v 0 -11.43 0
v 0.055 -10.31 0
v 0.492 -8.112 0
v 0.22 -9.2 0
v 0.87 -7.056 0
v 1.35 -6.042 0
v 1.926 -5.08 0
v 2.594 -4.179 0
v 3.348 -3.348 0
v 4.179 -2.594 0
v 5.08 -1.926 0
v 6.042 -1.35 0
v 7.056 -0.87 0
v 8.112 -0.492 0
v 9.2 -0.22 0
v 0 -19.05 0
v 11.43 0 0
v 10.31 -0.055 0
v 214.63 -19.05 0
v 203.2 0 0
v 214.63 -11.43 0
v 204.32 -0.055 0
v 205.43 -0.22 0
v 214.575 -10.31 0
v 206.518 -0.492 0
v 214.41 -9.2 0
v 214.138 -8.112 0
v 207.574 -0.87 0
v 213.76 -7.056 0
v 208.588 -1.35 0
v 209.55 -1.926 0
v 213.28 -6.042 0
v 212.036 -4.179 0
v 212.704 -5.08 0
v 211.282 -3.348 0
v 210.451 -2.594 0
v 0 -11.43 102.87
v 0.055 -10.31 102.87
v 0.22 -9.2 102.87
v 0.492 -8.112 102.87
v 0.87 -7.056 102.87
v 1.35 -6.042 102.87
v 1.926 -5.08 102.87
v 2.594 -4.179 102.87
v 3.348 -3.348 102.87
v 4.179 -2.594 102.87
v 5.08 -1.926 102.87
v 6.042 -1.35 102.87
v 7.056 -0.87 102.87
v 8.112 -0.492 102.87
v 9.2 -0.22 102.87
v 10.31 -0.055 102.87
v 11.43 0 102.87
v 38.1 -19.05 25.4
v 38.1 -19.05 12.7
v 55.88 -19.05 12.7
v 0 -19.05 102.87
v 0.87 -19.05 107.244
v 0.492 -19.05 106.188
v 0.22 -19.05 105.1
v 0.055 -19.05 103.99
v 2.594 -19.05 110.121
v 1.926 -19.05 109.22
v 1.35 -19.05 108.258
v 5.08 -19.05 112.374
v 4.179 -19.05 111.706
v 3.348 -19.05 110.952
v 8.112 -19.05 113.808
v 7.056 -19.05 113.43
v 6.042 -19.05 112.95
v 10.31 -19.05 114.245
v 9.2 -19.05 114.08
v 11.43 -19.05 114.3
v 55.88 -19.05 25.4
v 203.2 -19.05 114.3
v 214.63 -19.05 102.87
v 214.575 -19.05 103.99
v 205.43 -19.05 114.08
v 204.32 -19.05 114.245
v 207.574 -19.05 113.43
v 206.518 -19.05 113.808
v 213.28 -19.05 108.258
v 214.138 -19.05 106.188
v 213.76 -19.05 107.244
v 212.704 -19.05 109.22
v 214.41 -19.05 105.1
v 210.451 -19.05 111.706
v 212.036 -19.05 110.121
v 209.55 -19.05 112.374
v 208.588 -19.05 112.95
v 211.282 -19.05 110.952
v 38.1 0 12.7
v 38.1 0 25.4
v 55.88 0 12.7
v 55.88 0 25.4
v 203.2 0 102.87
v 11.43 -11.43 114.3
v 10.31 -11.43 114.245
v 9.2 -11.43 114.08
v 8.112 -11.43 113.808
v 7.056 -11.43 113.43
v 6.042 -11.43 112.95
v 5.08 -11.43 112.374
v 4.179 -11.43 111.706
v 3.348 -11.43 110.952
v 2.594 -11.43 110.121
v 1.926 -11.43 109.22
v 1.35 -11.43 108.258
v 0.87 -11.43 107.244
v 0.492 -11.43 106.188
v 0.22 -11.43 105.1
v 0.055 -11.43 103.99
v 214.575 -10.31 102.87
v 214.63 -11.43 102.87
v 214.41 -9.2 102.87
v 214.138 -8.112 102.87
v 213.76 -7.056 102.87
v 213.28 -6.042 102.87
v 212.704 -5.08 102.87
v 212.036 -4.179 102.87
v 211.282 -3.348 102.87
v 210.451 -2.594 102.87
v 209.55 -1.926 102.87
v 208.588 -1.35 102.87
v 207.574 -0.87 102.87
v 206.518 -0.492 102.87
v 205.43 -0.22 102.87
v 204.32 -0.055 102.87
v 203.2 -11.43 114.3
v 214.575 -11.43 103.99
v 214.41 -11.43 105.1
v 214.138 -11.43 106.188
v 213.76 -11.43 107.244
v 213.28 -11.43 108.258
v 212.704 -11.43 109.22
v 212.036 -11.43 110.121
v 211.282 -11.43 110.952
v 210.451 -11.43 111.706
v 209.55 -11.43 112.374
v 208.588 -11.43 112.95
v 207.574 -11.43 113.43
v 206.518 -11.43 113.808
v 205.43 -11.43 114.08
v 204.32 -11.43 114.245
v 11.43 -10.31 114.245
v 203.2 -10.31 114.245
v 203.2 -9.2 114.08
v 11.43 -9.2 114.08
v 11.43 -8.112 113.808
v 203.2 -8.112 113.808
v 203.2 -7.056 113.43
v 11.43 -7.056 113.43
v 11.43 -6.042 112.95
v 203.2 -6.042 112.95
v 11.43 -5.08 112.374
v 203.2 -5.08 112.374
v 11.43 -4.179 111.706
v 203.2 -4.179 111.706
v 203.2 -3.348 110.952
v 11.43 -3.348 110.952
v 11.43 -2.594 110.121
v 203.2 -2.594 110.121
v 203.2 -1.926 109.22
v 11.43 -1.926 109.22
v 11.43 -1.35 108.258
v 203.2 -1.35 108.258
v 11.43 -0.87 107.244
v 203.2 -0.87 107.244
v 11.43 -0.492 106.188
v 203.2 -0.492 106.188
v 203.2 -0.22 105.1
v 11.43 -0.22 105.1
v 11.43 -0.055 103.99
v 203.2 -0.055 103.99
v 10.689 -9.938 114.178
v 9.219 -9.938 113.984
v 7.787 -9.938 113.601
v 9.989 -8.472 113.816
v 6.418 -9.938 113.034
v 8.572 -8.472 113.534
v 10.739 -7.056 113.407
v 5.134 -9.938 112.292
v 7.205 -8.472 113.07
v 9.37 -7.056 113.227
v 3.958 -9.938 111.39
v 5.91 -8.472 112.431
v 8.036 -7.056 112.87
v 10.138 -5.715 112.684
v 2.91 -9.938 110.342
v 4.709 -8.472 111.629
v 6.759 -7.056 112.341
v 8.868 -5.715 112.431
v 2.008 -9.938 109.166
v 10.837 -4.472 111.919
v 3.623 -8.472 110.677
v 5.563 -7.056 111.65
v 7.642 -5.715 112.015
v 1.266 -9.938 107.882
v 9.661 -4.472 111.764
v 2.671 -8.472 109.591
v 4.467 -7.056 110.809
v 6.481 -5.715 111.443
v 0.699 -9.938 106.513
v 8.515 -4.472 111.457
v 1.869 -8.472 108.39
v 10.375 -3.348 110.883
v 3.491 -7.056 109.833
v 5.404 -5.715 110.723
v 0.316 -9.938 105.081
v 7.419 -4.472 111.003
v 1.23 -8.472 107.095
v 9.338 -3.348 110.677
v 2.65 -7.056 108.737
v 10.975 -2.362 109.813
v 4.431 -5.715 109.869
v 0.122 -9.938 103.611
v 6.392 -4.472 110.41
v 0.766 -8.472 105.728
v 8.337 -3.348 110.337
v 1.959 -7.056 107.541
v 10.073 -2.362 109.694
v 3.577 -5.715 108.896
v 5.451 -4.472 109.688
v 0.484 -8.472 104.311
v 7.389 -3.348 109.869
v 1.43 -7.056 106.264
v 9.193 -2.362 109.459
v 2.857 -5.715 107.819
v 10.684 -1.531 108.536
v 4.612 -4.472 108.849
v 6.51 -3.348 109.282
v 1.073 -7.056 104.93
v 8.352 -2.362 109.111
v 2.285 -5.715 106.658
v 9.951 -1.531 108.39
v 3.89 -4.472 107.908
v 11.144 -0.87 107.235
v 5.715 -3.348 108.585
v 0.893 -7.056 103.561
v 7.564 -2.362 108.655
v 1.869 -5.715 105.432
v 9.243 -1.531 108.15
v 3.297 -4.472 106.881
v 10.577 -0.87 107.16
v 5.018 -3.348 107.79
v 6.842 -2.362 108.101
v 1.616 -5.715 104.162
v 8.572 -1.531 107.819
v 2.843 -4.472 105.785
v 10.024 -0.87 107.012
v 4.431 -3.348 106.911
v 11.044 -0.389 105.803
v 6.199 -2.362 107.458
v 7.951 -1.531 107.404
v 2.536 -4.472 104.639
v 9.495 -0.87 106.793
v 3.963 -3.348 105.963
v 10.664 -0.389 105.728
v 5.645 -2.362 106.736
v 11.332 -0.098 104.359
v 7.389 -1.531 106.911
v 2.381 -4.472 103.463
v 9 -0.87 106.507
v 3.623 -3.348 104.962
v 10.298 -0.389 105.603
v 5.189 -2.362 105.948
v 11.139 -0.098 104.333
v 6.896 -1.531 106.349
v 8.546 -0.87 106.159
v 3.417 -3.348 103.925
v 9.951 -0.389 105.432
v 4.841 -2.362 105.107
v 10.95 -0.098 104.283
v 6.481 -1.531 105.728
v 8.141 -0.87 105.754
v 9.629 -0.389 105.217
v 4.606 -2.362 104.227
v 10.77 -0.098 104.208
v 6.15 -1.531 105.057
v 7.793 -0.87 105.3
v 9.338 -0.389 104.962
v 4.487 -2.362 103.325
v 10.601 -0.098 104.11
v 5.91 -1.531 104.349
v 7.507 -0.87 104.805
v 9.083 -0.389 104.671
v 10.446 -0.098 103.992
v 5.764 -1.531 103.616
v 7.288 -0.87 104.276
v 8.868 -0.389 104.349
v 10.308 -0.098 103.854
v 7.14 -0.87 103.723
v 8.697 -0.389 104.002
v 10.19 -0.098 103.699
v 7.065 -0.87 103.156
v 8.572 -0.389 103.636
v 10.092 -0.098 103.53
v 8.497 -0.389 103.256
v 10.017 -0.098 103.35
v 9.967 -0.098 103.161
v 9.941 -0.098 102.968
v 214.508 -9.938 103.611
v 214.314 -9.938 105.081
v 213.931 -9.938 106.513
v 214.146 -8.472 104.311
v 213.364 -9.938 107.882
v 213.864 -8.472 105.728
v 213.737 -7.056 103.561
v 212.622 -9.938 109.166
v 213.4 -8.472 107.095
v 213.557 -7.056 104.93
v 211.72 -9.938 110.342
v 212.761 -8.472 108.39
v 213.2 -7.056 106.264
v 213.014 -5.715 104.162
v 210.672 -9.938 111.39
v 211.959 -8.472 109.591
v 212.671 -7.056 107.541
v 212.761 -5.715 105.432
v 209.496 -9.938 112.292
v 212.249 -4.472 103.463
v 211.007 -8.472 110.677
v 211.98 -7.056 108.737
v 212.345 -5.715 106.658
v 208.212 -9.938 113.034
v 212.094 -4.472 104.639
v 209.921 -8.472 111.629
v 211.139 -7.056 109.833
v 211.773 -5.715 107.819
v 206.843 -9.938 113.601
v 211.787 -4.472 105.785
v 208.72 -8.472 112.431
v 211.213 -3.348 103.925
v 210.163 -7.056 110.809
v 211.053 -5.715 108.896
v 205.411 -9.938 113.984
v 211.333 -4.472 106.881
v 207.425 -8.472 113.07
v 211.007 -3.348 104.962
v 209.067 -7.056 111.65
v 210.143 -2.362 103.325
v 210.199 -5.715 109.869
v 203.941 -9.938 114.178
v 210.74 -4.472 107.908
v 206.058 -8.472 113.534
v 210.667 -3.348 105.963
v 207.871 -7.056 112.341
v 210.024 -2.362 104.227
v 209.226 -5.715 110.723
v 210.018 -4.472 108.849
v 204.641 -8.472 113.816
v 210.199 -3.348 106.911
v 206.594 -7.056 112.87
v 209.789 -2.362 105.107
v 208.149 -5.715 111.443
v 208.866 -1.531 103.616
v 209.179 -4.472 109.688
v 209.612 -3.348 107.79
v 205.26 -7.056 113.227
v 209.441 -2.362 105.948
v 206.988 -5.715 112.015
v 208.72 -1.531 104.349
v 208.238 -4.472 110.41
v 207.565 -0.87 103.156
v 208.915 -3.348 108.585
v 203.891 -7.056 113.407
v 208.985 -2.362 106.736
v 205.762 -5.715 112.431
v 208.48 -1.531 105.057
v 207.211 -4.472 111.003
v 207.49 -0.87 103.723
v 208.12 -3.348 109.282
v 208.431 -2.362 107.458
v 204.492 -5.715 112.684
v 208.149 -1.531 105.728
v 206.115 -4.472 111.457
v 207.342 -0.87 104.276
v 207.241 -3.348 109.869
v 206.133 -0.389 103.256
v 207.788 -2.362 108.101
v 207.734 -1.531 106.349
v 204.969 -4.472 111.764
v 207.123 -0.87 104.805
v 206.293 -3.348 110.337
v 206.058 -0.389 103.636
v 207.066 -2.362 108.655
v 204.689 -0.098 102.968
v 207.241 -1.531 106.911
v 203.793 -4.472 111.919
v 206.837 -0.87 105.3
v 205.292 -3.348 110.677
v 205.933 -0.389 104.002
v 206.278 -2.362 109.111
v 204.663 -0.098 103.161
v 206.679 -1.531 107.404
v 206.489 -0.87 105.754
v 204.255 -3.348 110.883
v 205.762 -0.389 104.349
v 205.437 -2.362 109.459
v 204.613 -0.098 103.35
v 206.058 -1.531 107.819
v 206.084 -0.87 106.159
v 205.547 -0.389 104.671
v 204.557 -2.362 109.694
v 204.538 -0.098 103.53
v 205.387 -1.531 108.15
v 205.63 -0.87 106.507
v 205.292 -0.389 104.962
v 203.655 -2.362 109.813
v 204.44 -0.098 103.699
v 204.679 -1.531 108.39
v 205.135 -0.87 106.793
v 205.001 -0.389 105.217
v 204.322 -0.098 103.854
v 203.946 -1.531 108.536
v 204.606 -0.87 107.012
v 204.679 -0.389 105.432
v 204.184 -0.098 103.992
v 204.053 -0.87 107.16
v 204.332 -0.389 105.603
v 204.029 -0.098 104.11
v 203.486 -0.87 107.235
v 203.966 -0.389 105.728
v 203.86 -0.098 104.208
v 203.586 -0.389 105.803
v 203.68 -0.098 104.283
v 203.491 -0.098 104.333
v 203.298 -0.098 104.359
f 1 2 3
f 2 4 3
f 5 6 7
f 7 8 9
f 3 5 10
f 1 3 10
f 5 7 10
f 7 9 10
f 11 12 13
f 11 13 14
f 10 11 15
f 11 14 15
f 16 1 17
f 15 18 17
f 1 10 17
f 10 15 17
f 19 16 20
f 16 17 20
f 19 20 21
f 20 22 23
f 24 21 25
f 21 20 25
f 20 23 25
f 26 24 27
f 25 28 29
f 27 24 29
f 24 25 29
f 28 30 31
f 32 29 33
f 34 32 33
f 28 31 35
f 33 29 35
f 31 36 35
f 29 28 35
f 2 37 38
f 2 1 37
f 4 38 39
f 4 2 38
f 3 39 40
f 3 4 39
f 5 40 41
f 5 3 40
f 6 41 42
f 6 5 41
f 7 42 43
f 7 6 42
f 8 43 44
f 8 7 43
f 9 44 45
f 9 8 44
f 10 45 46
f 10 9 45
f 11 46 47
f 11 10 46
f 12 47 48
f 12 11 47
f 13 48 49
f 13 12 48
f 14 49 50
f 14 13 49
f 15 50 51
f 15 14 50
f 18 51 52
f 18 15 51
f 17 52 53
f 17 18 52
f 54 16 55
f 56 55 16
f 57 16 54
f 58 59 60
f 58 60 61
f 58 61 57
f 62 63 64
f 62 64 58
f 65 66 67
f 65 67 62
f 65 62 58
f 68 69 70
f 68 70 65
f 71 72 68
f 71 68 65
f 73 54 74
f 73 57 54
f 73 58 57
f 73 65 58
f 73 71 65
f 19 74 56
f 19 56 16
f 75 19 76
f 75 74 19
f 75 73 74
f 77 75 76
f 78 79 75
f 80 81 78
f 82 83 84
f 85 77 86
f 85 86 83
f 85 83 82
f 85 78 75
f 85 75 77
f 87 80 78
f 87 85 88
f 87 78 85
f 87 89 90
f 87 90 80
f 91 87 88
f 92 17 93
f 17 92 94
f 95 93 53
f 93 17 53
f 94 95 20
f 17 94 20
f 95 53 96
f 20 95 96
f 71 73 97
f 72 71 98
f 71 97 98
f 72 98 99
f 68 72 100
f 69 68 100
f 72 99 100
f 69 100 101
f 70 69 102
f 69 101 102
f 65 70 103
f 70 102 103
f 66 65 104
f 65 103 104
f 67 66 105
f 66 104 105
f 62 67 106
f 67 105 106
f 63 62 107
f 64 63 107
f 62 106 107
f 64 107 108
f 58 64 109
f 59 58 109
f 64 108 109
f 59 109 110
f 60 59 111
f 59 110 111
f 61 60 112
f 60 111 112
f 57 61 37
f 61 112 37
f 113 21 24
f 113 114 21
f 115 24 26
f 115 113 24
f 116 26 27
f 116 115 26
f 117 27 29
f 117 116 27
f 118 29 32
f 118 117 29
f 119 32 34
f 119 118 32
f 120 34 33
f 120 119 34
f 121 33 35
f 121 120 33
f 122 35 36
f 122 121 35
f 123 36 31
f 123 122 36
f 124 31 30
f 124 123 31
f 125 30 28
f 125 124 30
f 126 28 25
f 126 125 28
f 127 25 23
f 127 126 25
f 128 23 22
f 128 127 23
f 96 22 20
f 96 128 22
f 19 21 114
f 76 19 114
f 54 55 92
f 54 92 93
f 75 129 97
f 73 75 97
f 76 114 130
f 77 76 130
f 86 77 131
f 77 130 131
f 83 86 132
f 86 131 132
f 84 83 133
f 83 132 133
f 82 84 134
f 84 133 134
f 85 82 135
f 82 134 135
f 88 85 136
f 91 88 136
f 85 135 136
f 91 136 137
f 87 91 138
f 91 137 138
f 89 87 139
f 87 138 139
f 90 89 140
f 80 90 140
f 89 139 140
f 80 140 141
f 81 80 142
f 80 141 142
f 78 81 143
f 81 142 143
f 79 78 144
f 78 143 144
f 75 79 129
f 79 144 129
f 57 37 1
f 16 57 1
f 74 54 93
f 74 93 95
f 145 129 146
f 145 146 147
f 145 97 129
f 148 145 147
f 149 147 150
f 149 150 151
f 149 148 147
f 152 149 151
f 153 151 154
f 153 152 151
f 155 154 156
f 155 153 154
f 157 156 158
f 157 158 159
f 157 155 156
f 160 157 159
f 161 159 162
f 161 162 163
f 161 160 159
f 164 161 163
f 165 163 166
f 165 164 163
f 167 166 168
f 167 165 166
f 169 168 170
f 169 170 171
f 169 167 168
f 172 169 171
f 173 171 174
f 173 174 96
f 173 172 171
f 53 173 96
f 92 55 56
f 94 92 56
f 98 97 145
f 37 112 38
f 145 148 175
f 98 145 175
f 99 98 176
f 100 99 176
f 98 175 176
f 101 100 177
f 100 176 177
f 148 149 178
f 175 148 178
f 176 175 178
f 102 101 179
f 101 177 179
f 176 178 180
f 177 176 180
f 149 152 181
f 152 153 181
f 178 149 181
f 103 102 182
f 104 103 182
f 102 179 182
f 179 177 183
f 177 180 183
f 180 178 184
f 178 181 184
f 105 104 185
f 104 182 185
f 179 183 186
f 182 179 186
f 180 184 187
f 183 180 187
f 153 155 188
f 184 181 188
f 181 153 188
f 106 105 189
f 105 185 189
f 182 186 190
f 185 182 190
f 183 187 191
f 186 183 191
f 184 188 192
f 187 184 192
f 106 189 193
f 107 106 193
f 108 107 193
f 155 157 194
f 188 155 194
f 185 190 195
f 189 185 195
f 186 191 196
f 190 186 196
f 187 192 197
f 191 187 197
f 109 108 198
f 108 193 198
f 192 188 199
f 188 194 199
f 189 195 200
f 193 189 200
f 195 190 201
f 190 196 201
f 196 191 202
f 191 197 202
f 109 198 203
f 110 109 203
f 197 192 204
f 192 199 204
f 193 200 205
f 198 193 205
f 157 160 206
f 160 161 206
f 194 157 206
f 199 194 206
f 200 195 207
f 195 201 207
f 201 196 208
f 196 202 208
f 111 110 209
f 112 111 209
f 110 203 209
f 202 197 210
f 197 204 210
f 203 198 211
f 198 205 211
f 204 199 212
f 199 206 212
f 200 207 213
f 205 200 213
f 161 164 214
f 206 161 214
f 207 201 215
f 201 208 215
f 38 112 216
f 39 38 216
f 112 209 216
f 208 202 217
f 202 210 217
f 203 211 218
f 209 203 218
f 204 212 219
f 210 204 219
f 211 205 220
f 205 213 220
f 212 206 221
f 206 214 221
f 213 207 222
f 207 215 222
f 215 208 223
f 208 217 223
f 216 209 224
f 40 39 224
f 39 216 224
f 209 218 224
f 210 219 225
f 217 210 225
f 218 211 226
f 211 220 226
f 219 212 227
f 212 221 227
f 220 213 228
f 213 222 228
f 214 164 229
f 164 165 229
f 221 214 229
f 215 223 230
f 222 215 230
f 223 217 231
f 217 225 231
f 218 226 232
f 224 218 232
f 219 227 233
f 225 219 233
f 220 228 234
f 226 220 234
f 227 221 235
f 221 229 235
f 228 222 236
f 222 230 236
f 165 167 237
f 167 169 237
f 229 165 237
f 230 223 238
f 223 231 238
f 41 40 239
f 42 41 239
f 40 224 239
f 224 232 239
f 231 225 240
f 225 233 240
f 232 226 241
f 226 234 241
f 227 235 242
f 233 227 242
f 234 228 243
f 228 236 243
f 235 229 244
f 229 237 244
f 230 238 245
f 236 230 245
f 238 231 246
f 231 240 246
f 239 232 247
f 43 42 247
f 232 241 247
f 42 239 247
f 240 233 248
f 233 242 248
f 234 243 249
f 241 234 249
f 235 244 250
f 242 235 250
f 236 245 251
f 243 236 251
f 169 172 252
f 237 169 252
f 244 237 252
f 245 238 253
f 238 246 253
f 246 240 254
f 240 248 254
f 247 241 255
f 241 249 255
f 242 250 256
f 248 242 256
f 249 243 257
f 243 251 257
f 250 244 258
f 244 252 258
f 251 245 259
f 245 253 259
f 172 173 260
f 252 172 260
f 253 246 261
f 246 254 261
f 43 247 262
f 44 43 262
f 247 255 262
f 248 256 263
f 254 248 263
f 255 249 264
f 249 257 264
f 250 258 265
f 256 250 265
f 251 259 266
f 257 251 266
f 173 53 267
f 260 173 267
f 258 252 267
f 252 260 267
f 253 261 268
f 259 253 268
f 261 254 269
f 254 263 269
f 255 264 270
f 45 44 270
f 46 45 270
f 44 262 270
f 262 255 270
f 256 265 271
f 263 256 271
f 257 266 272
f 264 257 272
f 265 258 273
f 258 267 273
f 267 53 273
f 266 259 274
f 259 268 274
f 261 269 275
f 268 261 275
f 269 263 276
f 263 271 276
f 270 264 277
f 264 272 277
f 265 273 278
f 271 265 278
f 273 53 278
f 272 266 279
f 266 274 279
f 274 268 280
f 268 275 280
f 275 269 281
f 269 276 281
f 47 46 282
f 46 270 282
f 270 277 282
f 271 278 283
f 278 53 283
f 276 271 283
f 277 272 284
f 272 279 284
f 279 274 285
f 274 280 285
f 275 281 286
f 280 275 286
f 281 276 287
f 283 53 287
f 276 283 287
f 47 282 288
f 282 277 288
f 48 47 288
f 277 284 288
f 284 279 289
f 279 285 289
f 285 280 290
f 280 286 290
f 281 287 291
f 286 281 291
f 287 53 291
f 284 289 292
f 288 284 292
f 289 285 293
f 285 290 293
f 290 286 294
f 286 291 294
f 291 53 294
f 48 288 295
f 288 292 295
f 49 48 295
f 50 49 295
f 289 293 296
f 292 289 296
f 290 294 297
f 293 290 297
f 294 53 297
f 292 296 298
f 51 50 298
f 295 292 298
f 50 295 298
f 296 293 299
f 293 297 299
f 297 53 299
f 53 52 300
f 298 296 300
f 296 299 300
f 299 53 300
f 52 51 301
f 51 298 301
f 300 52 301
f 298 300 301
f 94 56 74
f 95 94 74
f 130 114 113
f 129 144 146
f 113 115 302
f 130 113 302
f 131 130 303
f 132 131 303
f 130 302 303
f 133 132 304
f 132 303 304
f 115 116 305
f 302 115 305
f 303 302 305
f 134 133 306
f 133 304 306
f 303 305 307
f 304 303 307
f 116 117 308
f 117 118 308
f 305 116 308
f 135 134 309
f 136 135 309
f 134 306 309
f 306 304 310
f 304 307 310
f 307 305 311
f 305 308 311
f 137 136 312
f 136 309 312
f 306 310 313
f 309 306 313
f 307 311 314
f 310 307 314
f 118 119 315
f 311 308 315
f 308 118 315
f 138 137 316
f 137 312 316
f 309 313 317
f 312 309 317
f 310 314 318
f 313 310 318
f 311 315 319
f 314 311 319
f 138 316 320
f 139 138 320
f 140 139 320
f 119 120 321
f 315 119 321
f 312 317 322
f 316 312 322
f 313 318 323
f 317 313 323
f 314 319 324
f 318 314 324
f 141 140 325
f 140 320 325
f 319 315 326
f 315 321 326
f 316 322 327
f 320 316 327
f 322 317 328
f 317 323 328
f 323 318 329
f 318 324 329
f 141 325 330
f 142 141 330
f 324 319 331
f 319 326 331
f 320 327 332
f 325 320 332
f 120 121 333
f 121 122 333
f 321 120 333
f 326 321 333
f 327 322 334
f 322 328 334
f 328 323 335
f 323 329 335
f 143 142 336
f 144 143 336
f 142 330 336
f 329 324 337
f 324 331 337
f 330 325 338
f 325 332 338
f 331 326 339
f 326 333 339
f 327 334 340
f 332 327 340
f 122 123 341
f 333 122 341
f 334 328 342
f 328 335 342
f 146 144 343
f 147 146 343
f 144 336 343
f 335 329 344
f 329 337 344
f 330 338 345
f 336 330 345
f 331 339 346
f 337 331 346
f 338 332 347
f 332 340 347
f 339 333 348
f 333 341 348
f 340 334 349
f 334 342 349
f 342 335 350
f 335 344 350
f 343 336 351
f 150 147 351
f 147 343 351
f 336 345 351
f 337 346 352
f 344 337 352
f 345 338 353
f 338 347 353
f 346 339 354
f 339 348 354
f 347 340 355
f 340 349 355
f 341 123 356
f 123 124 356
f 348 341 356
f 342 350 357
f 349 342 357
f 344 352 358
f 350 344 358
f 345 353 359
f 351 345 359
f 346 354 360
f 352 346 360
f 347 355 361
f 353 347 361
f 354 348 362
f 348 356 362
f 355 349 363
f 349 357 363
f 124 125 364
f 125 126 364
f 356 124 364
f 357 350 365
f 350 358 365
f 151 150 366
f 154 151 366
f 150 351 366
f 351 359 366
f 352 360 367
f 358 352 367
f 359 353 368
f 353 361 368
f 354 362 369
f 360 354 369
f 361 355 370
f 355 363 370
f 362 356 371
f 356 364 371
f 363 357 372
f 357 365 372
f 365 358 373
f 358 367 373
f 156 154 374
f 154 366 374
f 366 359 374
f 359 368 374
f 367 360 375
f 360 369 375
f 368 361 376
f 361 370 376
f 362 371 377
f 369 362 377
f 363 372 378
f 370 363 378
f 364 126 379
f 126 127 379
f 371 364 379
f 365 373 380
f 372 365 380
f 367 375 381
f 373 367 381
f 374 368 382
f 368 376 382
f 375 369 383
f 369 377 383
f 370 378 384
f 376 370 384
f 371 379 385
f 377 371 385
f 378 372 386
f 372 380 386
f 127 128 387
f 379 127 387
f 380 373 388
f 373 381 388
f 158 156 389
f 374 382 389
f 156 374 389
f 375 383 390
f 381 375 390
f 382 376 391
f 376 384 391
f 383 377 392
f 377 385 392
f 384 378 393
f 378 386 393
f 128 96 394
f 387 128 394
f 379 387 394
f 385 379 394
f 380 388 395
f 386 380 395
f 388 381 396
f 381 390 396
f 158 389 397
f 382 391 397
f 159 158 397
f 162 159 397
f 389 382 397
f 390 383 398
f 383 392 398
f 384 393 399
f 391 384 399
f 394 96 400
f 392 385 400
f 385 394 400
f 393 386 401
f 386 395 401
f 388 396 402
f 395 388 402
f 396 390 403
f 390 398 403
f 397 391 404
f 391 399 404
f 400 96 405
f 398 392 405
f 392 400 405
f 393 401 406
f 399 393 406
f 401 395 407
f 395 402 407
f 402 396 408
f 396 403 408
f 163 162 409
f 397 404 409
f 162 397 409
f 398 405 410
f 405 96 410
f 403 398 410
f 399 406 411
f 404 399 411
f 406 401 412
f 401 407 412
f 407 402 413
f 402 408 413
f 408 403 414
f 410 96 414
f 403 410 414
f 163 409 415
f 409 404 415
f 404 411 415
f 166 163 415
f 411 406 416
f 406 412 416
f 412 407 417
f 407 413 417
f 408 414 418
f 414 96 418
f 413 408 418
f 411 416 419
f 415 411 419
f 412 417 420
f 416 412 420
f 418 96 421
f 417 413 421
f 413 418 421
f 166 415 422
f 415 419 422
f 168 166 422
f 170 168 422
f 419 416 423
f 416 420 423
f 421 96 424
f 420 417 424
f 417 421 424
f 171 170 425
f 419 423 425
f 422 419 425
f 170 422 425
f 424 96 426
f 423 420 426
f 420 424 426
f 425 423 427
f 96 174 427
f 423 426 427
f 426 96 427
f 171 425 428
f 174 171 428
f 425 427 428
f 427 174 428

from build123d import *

# Parameters (mm, degrees)
F1_DEPTH = 19.05
F2_R     = 11.43
F3_W     = 17.78
F3_H     = 12.7
F4_DEPTH = 25.4


with BuildPart() as f1:
    # F0 (on Front) → F1 (new body)
    with BuildSketch(Plane.XZ):
        with BuildLine():
            Line((0, 102.87), (0, 0))
            Line((0, 0), (214.63, 0))
            Line((214.63, 0), (214.63, 102.87))
            ThreePointArc((214.63, 102.87), (211.282230509, 110.952230509), (203.2, 114.3))
            Line((203.2, 114.3), (11.43, 114.3))
            ThreePointArc((11.43, 114.3), (3.347769491, 110.952230509), (0, 102.87))
        make_face()
    extrude(amount=F1_DEPTH)

    # F2
    f2_edges = [f1.edges().sort_by_distance(p)[0] for p in [
        (107.315, 0, 114.3),
    ]]
    fillet(f2_edges, radius=F2_R)

    # F3 (on face) → F4 (cut)
    with BuildSketch(Plane.XZ.offset(19.05)):
        with Locations((46.99, 19.05)):
            Rectangle(F3_W, F3_H)
    extrude(amount=-F4_DEPTH, mode=Mode.SUBTRACT)


solid = f1.part
